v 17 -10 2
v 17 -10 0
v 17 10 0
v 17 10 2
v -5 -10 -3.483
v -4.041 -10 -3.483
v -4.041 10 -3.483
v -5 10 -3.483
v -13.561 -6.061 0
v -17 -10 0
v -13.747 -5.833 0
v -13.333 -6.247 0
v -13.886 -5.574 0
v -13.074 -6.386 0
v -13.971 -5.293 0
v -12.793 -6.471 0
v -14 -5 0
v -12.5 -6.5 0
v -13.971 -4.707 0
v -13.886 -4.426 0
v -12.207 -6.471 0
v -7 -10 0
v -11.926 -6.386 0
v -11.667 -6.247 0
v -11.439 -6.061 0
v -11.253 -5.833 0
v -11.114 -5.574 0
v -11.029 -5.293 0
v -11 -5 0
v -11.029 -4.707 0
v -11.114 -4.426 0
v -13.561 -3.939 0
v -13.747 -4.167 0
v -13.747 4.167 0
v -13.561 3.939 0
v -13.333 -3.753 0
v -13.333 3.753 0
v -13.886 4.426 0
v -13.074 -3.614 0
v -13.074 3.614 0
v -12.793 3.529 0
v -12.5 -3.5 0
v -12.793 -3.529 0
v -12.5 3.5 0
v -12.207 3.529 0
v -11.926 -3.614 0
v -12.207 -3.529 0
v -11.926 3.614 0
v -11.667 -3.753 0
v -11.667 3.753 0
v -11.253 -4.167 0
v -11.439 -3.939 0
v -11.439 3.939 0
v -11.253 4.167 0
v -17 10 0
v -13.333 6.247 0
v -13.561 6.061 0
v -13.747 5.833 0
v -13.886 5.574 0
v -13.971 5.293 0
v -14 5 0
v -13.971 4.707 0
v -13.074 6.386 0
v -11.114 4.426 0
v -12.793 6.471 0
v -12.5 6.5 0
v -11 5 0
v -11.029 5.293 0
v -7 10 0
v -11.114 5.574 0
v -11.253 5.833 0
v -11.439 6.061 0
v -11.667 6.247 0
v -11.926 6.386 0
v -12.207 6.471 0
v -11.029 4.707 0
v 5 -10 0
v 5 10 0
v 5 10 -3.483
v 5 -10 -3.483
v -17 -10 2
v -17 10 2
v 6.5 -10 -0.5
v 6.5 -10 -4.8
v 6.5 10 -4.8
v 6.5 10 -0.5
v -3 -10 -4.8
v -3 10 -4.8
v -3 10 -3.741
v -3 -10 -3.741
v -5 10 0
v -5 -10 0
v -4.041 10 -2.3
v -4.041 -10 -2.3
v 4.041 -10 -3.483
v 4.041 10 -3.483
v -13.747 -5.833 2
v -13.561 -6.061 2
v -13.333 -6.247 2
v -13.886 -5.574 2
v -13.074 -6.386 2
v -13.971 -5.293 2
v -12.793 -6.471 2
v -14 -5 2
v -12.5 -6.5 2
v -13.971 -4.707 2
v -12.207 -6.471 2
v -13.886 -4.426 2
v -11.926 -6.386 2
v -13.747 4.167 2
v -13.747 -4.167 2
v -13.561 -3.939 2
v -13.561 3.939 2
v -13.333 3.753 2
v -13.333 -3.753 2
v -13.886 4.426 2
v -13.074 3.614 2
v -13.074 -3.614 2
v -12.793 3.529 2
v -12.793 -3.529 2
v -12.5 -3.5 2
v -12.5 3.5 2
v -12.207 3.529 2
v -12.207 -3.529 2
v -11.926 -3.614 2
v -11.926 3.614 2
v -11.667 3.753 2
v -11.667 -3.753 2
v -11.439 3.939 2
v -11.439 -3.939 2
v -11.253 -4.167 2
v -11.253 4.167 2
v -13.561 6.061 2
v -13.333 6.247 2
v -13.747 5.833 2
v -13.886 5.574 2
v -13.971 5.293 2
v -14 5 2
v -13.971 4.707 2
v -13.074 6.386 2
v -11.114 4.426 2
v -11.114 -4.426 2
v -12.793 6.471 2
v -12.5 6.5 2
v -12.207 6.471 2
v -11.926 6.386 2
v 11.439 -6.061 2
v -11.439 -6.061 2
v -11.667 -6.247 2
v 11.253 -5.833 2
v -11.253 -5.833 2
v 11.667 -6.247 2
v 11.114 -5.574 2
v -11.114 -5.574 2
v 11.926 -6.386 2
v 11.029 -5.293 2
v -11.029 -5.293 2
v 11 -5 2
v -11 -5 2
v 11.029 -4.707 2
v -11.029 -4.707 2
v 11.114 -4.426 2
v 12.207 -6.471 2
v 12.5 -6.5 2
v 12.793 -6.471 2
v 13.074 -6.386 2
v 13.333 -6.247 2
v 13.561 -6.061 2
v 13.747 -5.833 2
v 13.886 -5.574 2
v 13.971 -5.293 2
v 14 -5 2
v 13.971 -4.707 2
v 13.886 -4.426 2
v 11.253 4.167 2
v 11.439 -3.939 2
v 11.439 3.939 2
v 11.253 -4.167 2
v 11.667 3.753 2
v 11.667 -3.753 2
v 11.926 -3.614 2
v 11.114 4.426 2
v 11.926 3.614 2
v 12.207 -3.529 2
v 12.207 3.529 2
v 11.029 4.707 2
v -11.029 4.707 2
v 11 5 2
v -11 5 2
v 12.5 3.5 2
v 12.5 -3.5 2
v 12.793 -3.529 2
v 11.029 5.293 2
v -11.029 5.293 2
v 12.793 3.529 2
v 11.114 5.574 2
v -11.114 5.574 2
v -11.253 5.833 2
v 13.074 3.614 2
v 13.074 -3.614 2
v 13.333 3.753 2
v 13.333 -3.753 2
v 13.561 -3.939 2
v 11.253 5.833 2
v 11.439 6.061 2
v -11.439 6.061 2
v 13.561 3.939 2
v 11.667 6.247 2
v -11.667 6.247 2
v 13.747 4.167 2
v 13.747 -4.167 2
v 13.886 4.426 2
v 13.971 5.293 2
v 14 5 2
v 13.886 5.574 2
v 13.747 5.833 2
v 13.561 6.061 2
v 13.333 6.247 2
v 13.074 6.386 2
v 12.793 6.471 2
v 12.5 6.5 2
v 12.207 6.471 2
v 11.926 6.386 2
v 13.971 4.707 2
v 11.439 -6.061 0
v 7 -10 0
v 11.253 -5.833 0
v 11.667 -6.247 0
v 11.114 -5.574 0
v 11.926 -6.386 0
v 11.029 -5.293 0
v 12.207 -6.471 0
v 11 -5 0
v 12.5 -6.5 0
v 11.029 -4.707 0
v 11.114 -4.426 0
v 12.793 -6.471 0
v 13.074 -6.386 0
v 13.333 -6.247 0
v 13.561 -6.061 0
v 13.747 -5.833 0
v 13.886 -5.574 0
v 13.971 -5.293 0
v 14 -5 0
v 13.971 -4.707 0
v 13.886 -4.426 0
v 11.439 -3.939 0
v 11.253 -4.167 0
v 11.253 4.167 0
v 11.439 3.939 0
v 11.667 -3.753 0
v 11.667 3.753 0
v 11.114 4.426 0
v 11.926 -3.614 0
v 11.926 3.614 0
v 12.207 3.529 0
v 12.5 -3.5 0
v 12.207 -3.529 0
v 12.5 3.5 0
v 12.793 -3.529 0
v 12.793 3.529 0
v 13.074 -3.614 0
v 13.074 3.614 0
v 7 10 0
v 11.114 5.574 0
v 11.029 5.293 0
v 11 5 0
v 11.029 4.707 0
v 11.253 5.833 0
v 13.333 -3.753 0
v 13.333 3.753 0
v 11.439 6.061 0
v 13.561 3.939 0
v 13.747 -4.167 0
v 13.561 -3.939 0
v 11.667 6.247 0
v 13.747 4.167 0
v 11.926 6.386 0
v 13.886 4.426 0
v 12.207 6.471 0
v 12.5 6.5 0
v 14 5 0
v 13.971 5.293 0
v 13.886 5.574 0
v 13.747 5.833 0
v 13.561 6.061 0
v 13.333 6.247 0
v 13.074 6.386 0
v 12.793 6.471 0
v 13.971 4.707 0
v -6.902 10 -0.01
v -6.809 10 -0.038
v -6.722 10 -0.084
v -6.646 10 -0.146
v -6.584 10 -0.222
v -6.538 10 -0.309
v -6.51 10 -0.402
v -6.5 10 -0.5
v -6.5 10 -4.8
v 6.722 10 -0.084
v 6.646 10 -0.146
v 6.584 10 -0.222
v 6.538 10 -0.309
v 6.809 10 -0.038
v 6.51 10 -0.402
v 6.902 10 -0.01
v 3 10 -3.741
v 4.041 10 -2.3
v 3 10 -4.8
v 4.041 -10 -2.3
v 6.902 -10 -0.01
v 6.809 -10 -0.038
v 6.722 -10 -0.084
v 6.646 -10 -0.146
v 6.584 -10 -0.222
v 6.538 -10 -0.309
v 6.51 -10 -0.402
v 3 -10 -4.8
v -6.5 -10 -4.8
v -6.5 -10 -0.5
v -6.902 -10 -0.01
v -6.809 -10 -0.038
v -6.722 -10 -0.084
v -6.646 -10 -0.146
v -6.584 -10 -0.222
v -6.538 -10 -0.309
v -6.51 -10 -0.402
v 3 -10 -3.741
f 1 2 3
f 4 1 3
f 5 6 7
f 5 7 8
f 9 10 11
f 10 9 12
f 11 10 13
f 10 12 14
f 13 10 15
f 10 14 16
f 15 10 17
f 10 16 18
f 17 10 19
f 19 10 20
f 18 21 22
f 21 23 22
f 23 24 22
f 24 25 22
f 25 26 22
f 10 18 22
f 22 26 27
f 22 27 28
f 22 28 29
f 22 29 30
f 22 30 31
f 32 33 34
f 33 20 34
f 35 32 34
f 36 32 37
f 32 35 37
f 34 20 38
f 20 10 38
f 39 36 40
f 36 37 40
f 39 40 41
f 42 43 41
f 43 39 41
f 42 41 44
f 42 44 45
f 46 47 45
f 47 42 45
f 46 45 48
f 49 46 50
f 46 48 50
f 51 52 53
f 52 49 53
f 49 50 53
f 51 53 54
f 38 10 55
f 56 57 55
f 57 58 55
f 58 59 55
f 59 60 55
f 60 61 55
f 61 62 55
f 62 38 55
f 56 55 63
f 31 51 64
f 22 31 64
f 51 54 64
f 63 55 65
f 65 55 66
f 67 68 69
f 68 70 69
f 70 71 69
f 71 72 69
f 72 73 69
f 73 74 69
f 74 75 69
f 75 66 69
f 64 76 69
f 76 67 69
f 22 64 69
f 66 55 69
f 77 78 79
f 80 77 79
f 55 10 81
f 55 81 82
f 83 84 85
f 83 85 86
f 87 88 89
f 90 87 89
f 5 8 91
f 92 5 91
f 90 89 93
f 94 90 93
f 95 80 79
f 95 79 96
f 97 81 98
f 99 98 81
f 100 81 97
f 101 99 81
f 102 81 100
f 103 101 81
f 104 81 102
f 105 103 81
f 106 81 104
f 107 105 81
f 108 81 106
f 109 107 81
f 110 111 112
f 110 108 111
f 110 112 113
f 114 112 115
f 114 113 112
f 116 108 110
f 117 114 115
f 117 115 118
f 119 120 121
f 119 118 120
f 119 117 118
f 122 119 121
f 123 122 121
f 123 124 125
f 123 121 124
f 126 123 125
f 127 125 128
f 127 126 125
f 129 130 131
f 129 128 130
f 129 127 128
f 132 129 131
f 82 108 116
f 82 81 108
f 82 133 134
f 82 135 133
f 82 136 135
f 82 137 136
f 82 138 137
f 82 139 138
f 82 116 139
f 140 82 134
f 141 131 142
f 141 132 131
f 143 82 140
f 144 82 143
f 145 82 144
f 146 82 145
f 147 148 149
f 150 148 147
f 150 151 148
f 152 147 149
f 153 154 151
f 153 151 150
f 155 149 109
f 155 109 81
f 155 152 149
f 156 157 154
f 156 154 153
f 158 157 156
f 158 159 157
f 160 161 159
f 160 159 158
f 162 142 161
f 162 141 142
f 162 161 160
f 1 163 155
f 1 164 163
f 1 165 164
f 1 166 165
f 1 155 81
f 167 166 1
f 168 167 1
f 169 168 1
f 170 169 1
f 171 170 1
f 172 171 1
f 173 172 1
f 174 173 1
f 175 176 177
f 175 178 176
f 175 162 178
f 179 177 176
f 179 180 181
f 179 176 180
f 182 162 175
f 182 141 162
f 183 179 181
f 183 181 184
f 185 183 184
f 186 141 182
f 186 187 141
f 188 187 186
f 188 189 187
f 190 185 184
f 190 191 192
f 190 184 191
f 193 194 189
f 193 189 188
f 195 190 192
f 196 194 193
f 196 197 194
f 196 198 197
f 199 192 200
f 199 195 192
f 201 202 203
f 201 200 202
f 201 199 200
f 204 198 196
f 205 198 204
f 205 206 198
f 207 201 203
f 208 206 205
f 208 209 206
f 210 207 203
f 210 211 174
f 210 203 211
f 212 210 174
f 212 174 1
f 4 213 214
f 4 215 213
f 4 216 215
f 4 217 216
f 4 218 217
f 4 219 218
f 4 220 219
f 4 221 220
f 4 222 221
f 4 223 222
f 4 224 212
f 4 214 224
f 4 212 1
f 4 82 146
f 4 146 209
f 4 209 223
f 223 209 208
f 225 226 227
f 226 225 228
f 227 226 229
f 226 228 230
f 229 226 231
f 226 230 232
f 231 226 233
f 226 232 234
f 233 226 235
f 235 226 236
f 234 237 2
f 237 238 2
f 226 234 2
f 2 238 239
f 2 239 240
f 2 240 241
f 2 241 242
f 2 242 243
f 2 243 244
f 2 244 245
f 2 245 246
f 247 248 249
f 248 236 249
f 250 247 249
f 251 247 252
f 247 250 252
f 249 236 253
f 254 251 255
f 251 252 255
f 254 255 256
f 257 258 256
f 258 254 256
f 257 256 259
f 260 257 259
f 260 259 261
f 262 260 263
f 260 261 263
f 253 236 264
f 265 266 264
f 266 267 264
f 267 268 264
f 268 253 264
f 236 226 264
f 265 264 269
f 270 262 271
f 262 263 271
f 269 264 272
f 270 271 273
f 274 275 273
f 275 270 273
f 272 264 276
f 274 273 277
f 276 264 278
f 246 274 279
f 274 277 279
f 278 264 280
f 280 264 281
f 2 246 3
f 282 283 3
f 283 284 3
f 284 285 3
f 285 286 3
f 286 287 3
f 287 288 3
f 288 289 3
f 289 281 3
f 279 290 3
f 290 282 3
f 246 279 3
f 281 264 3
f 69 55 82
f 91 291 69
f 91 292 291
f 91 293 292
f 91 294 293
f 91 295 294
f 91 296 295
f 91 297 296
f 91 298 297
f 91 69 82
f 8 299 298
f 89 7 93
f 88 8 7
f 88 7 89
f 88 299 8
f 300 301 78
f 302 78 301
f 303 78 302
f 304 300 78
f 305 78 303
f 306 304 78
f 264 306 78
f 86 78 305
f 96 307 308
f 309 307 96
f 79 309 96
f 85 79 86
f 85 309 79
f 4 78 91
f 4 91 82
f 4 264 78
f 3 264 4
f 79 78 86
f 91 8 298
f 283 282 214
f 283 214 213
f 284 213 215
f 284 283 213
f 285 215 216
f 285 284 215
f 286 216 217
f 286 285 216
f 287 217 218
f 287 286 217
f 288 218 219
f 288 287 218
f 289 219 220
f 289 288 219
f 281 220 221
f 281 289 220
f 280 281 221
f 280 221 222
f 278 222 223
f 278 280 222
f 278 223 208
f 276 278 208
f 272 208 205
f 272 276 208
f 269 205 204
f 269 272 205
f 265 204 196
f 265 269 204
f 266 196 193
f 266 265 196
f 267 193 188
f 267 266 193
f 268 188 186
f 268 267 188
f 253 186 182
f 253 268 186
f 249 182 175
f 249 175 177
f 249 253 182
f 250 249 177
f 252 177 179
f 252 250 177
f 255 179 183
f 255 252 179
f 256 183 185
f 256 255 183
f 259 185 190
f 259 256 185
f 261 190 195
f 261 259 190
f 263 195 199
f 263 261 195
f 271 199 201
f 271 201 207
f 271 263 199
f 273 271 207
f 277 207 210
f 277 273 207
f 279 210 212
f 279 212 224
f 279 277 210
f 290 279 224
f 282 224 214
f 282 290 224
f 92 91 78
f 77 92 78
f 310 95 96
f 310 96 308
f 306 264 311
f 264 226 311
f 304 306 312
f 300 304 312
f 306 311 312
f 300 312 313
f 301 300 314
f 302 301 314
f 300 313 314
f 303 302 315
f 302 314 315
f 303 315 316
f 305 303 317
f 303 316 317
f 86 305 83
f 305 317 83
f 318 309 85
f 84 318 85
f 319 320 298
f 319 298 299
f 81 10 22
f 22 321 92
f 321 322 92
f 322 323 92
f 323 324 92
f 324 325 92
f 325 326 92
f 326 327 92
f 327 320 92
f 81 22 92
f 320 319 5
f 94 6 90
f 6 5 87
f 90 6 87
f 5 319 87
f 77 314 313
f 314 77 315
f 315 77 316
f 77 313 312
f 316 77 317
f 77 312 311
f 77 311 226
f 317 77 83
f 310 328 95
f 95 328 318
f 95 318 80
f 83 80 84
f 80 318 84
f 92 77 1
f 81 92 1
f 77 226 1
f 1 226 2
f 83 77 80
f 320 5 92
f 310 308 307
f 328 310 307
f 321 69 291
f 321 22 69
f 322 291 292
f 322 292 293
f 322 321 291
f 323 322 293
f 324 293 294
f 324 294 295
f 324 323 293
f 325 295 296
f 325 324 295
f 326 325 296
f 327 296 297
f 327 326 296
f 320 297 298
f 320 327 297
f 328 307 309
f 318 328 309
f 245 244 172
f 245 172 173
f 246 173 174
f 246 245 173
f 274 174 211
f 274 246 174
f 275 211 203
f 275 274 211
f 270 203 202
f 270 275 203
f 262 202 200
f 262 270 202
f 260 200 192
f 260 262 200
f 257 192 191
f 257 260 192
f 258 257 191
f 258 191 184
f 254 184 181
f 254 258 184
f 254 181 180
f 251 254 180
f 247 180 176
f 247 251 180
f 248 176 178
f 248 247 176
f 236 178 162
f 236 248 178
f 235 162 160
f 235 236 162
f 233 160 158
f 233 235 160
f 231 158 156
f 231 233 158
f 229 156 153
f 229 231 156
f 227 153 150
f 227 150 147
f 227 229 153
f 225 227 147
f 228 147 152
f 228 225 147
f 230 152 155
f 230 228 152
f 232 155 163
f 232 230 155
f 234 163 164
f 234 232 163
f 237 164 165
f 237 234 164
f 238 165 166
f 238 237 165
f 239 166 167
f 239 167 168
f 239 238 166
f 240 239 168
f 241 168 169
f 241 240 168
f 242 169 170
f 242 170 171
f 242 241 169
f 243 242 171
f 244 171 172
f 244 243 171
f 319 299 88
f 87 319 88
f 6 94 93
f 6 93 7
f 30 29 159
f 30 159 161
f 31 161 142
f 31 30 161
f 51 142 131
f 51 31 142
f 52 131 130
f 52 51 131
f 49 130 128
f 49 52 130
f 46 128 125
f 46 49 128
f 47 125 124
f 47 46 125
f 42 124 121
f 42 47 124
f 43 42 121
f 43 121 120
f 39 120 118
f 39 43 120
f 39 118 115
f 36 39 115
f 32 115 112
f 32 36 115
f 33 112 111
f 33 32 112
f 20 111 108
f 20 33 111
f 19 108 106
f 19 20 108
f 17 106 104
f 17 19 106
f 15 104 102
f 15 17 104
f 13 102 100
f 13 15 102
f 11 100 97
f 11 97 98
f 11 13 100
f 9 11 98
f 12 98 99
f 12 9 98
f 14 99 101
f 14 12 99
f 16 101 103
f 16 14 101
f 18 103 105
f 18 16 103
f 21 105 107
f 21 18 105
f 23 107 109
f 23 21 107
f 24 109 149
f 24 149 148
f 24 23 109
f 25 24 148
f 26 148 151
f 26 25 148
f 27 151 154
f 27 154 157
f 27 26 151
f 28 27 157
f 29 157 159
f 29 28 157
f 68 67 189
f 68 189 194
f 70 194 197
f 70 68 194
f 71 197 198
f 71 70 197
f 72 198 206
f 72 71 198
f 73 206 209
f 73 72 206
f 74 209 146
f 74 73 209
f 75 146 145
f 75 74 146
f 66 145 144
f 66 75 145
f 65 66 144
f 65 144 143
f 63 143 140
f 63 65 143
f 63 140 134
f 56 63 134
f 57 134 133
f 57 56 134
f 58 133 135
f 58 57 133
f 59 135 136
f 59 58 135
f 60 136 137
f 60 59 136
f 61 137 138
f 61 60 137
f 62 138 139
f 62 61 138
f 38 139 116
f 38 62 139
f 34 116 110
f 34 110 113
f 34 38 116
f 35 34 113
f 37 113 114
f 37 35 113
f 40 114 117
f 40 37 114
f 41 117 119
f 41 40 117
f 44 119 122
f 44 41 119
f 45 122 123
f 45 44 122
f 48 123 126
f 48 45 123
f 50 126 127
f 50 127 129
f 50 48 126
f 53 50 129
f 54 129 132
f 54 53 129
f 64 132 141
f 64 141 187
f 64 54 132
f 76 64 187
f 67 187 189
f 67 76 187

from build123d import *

# Parameters (mm, degrees)
CROQUIS1_W              = 34
CROQUIS1_H              = 20
CROQUIS1_R              = 1.5
BASE_DEPTH              = 2
SALIENTE_EXTRUIR2_DEPTH = 20
REDONDEO1_R             = 0.5


with BuildPart() as part:
    # Croquis1 → Base (new body)
    with BuildSketch(Plane.XY):
        Rectangle(CROQUIS1_W, CROQUIS1_H)
        with Locations((12.5, 5)):
            Circle(CROQUIS1_R, mode=Mode.SUBTRACT)
        with Locations((-12.5, 5)):
            Circle(CROQUIS1_R, mode=Mode.SUBTRACT)
        with Locations((-12.5, -5)):
            Circle(CROQUIS1_R, mode=Mode.SUBTRACT)
        with Locations((12.5, -5)):
            Circle(CROQUIS1_R, mode=Mode.SUBTRACT)
    extrude(amount=BASE_DEPTH)

    # Croquis2 → Saliente-Extruir2 (add, through all)
    with BuildSketch(Plane(origin=(0, 10, 0), x_dir=(1, 0, 0), z_dir=(0, 1, 0))):
        Polygon((-5, 0), (-6.5, 0), (-6.5, 4.8), (-3, 4.8), (-3, 3.741089378), (-4.040563392, 2.3), (-4.040563392, 3.482732018), (-5, 3.482732018), align=None)
        Polygon((3, 4.8), (6.5, 4.8), (6.5, 0), (5, 0), (5, 3.482732018), (4.040563392, 3.482732018), (4.040563392, 2.3), (3, 3.741089378), align=None)
    extrude(amount=-SALIENTE_EXTRUIR2_DEPTH)

    # Redondeo1
    redondeo1_edges = [part.edges().sort_by_distance(p)[0] for p in [
        (-6.5, 0, 0),
        (6.5, 0, 0),
    ]]
    fillet(redondeo1_edges, radius=REDONDEO1_R)


solid = part.part
